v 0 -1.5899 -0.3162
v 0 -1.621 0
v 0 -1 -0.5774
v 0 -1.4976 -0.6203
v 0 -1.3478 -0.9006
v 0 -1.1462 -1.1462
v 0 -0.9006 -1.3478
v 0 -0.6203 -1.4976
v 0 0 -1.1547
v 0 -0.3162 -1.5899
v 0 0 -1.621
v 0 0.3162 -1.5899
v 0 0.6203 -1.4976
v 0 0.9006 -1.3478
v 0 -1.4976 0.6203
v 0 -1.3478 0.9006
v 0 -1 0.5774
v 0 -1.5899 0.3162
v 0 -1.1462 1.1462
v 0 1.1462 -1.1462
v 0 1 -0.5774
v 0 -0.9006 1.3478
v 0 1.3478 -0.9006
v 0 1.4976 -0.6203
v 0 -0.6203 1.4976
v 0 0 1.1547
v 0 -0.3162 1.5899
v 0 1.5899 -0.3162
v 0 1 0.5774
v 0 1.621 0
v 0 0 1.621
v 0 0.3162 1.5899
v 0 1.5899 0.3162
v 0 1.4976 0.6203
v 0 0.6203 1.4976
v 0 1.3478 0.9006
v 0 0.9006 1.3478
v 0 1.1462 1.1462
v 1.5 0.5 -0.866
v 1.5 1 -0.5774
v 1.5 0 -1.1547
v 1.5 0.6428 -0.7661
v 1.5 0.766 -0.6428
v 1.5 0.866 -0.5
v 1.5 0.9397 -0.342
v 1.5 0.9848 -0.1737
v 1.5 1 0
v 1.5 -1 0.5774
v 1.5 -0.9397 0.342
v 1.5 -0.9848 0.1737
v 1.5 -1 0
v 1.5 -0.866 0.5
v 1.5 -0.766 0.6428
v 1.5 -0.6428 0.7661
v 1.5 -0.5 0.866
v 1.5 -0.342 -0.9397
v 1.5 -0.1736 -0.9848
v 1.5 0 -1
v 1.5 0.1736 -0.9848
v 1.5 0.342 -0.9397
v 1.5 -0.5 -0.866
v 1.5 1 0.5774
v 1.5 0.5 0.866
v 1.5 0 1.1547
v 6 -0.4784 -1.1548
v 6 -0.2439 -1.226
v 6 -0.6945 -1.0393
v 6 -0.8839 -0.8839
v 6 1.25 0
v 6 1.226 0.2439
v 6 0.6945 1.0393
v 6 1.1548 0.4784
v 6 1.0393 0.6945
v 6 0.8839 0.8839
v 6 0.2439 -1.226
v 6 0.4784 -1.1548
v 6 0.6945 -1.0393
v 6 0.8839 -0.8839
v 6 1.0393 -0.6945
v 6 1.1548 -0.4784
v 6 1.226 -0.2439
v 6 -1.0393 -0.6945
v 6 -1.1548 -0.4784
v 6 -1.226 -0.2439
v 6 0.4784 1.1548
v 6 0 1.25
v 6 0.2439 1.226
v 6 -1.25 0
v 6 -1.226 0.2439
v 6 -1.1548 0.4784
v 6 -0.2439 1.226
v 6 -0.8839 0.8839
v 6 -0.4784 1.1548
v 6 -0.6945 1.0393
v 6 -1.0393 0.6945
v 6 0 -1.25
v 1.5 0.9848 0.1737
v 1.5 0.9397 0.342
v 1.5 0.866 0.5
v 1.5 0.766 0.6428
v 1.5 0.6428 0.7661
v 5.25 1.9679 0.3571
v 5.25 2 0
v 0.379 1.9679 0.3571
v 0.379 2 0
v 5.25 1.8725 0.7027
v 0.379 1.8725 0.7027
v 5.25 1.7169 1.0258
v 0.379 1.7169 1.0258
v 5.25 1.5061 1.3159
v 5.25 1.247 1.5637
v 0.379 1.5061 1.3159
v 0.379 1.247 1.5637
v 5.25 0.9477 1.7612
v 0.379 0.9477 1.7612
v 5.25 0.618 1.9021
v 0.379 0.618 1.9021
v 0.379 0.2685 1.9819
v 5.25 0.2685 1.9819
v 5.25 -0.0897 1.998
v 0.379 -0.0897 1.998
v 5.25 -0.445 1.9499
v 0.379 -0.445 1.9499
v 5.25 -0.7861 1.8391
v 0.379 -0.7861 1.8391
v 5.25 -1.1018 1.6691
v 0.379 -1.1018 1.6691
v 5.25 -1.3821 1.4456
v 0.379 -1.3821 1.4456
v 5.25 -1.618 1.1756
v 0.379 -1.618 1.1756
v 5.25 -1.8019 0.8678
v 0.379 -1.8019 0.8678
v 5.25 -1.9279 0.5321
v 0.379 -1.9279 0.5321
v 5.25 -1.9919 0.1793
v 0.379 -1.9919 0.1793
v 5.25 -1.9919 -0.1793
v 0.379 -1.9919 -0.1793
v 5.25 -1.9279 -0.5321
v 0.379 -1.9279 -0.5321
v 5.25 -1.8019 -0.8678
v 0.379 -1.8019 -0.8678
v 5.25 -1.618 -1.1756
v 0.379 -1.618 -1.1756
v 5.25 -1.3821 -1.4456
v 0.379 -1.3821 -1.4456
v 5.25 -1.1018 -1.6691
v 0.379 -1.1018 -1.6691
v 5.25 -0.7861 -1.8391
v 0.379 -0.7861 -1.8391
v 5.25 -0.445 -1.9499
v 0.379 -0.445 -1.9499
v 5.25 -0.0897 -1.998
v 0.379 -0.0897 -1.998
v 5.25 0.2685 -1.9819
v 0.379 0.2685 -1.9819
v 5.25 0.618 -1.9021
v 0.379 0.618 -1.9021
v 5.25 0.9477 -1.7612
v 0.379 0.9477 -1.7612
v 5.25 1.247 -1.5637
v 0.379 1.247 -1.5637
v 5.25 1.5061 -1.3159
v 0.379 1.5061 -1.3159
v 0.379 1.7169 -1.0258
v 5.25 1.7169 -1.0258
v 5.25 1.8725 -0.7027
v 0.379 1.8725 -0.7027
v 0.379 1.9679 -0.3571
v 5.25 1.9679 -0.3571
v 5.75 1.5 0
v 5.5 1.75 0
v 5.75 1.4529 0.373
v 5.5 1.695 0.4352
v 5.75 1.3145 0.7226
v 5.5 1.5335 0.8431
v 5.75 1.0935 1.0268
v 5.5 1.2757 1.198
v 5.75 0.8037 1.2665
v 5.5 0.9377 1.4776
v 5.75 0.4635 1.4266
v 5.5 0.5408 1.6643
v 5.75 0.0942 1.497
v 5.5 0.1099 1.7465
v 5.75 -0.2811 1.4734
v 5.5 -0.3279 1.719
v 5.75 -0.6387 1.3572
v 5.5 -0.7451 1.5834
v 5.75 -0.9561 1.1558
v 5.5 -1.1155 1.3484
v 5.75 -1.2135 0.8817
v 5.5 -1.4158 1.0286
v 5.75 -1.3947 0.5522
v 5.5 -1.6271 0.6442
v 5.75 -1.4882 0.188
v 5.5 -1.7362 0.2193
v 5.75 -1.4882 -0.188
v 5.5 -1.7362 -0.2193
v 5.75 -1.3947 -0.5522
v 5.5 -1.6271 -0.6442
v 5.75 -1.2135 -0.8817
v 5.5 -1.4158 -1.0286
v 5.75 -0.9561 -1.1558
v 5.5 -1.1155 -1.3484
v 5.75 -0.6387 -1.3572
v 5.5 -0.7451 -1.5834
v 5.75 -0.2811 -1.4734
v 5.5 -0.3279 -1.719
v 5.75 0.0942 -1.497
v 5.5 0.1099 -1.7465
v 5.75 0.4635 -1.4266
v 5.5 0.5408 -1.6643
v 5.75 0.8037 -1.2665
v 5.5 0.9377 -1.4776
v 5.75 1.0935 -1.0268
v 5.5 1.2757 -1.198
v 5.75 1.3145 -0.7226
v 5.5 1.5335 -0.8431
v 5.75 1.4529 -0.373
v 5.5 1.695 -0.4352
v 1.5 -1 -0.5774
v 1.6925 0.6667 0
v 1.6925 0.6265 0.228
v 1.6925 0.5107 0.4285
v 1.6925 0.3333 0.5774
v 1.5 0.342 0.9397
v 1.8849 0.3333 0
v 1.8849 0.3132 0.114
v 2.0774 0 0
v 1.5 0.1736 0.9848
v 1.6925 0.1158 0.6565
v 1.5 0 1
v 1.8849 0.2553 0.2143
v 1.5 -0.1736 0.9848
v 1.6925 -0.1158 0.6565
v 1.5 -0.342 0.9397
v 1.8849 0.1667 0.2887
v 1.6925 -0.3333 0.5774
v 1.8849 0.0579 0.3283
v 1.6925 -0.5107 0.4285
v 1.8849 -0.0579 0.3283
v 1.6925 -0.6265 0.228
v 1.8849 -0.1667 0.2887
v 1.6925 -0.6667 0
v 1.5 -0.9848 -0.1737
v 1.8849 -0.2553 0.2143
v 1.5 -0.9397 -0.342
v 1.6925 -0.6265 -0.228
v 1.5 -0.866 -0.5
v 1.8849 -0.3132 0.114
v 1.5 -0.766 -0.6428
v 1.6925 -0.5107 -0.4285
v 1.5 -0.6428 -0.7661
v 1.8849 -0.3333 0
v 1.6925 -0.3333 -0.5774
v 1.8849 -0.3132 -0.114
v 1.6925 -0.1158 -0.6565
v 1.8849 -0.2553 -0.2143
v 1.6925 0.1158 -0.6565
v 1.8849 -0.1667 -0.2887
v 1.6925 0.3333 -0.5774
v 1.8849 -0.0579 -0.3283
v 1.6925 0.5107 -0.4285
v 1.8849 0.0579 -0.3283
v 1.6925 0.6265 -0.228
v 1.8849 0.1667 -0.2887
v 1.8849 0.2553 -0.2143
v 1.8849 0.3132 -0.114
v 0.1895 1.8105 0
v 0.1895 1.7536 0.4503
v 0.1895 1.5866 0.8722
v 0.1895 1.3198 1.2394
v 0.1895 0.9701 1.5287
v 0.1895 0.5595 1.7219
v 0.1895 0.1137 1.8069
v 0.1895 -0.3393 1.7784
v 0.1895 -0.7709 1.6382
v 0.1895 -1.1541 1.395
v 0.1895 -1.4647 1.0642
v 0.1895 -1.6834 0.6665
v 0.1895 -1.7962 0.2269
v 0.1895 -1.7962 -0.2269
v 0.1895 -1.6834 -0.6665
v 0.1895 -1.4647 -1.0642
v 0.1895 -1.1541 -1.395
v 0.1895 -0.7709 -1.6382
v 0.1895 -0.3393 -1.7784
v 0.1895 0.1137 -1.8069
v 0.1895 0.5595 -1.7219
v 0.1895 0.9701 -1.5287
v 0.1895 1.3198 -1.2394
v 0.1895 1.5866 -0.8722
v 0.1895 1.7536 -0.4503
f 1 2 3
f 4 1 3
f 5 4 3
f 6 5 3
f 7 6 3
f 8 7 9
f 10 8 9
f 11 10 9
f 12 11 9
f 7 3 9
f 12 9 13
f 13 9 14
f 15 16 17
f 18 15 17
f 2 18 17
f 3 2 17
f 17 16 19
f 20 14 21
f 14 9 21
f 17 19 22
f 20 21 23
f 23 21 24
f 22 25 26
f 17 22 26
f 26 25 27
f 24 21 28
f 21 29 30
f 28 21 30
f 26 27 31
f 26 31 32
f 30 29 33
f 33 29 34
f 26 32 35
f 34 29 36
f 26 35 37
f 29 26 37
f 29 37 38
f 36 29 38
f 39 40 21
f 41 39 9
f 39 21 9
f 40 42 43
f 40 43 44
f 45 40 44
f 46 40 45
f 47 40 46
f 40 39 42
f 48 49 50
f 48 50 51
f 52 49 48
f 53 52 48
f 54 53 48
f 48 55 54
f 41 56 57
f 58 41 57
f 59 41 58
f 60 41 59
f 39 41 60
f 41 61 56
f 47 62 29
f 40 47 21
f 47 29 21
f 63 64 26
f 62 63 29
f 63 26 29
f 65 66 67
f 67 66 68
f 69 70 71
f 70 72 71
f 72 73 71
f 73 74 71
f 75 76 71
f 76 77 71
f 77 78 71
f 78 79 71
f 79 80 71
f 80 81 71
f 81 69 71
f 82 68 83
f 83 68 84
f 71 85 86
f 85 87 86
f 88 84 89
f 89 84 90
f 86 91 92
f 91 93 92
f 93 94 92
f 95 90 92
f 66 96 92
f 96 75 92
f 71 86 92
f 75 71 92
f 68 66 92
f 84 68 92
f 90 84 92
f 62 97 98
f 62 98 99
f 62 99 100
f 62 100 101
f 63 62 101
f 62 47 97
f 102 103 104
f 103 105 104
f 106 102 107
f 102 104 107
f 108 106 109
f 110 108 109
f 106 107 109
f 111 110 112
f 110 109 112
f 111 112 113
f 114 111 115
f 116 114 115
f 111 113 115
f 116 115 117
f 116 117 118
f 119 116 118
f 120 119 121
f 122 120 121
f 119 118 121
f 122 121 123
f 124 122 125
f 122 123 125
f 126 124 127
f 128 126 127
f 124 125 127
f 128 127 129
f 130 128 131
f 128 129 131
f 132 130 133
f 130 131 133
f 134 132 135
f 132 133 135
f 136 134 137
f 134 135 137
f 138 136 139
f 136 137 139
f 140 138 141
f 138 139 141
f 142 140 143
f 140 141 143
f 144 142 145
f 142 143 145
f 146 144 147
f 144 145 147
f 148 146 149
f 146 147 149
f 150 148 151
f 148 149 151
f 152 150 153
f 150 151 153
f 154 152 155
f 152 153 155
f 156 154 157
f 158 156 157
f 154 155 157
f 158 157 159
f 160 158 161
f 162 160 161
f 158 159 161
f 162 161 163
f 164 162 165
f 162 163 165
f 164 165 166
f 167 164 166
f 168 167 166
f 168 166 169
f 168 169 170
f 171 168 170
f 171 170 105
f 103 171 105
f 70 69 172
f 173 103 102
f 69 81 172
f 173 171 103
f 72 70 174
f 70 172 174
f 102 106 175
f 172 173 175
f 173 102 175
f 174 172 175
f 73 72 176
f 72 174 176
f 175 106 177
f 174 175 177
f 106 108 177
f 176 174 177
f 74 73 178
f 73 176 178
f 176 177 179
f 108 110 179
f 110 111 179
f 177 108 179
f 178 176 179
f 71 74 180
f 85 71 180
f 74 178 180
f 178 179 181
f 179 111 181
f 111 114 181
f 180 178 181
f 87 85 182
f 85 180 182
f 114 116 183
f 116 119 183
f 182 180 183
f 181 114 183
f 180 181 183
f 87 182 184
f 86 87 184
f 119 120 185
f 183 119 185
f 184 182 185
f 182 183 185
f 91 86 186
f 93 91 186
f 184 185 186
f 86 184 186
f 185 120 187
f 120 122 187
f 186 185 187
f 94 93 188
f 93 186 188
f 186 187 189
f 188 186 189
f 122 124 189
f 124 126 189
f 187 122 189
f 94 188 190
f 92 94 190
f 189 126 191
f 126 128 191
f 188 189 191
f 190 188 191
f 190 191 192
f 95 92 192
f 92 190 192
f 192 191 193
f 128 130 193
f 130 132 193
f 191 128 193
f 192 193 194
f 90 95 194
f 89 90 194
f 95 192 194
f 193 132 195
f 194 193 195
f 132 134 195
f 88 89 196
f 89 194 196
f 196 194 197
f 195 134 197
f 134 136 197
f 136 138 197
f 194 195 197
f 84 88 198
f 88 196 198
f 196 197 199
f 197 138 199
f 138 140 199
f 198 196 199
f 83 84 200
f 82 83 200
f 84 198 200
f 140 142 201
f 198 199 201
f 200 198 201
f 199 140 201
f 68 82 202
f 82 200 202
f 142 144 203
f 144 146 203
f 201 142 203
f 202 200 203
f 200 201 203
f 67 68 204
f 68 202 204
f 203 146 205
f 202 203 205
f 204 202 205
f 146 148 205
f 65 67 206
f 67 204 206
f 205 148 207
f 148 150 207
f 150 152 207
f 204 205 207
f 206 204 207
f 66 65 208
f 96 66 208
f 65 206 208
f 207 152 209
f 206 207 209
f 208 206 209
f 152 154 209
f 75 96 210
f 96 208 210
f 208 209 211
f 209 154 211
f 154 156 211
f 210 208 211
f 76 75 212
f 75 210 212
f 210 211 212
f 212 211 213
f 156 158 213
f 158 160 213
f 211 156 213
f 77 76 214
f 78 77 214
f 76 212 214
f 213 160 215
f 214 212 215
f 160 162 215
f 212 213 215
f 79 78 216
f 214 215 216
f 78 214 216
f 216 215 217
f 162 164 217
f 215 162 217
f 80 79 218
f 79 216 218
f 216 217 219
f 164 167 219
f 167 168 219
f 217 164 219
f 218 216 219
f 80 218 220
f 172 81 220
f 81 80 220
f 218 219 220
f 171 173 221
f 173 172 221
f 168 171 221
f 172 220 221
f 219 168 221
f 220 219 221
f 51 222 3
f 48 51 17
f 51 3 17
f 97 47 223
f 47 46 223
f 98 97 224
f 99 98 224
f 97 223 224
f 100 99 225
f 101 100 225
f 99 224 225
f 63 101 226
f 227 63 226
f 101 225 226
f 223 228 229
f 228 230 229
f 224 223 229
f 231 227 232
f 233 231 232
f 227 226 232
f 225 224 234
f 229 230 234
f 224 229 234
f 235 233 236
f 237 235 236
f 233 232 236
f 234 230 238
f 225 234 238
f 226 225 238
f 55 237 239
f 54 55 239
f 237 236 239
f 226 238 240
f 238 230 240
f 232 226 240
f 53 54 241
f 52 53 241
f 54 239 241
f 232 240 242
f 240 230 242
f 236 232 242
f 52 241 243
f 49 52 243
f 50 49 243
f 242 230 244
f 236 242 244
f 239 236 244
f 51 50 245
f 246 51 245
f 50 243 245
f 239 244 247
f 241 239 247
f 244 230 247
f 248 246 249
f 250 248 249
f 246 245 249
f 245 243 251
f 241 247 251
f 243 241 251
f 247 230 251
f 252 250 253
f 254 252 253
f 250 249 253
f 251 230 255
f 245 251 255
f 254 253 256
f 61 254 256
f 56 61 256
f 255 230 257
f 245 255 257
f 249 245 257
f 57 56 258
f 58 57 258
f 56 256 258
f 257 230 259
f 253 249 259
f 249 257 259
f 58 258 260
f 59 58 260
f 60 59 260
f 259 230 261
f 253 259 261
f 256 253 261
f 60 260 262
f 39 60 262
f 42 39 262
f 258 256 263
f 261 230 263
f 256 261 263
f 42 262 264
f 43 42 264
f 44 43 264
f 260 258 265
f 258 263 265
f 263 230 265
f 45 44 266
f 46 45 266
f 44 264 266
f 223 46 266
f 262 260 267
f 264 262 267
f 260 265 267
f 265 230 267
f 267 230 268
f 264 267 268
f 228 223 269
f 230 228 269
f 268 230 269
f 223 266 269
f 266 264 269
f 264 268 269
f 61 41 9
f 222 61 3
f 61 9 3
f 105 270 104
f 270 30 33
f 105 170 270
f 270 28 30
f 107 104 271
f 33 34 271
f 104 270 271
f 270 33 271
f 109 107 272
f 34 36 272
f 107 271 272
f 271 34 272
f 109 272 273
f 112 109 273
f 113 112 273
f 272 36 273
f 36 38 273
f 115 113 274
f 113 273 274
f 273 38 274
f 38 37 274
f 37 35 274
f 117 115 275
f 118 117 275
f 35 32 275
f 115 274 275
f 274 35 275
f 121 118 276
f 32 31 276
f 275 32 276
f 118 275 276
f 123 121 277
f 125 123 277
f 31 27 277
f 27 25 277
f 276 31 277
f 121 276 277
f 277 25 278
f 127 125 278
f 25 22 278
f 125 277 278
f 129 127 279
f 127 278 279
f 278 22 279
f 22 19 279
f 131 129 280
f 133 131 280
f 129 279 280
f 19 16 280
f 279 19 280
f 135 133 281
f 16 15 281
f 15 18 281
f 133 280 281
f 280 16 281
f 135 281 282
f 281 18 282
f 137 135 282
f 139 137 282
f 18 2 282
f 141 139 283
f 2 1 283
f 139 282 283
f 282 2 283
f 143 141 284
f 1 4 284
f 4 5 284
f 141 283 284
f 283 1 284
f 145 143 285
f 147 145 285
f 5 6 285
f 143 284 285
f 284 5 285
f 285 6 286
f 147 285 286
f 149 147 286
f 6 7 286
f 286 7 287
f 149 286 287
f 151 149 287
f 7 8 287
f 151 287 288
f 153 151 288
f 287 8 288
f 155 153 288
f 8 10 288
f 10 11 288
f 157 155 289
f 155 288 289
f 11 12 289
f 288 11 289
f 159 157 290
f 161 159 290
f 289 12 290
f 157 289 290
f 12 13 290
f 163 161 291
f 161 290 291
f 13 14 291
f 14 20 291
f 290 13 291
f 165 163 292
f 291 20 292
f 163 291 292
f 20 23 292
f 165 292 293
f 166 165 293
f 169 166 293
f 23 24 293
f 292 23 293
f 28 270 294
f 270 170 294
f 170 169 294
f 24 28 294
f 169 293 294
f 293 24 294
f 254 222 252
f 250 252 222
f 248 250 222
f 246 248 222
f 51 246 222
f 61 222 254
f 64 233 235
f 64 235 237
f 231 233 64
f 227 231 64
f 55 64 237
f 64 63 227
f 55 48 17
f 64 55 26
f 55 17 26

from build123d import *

# Parameters (mm, degrees)
HEXAGONSOCKET_DEPTH = 1.5


with BuildPart() as part:
    # Sketch1 → Base (revolve)
    with BuildSketch(Plane.XY):
        Polygon((0, 0), (6, 0), (6, 1.25), (5.25, 2), (0.379, 2), (0, 1.621), align=None)
    revolve(axis=Axis((-10.745014543, 0, 0), (1, 0, 0)))

    # Sketch2 → HexagonSocket (cut)
    with BuildSketch(Plane(origin=(0, -0.021932325, 0.010138848), x_dir=(0, 0, 1), z_dir=(-1, 0, 0))):
        Polygon((1.14456169, 0.021932325), (0.567211421, 1.021932325), (-0.587489117, 1.021932325), (-1.164839386, 0.021932325), (-0.587489117, -0.978067675), (0.567211421, -0.978067675), align=None)
    extrude(amount=-HEXAGONSOCKET_DEPTH, mode=Mode.SUBTRACT)

    # Sketch3 → Cut-Revolve1 (revolve, cut)
    with BuildSketch(Plane.XY):
        Polygon((1.5, 1), (2.077350269, 0), (1.5, 0), align=None)
    revolve(axis=Axis((-3.144113667, 0, 0), (1, 0, 0)), mode=Mode.SUBTRACT)


solid = part.part
